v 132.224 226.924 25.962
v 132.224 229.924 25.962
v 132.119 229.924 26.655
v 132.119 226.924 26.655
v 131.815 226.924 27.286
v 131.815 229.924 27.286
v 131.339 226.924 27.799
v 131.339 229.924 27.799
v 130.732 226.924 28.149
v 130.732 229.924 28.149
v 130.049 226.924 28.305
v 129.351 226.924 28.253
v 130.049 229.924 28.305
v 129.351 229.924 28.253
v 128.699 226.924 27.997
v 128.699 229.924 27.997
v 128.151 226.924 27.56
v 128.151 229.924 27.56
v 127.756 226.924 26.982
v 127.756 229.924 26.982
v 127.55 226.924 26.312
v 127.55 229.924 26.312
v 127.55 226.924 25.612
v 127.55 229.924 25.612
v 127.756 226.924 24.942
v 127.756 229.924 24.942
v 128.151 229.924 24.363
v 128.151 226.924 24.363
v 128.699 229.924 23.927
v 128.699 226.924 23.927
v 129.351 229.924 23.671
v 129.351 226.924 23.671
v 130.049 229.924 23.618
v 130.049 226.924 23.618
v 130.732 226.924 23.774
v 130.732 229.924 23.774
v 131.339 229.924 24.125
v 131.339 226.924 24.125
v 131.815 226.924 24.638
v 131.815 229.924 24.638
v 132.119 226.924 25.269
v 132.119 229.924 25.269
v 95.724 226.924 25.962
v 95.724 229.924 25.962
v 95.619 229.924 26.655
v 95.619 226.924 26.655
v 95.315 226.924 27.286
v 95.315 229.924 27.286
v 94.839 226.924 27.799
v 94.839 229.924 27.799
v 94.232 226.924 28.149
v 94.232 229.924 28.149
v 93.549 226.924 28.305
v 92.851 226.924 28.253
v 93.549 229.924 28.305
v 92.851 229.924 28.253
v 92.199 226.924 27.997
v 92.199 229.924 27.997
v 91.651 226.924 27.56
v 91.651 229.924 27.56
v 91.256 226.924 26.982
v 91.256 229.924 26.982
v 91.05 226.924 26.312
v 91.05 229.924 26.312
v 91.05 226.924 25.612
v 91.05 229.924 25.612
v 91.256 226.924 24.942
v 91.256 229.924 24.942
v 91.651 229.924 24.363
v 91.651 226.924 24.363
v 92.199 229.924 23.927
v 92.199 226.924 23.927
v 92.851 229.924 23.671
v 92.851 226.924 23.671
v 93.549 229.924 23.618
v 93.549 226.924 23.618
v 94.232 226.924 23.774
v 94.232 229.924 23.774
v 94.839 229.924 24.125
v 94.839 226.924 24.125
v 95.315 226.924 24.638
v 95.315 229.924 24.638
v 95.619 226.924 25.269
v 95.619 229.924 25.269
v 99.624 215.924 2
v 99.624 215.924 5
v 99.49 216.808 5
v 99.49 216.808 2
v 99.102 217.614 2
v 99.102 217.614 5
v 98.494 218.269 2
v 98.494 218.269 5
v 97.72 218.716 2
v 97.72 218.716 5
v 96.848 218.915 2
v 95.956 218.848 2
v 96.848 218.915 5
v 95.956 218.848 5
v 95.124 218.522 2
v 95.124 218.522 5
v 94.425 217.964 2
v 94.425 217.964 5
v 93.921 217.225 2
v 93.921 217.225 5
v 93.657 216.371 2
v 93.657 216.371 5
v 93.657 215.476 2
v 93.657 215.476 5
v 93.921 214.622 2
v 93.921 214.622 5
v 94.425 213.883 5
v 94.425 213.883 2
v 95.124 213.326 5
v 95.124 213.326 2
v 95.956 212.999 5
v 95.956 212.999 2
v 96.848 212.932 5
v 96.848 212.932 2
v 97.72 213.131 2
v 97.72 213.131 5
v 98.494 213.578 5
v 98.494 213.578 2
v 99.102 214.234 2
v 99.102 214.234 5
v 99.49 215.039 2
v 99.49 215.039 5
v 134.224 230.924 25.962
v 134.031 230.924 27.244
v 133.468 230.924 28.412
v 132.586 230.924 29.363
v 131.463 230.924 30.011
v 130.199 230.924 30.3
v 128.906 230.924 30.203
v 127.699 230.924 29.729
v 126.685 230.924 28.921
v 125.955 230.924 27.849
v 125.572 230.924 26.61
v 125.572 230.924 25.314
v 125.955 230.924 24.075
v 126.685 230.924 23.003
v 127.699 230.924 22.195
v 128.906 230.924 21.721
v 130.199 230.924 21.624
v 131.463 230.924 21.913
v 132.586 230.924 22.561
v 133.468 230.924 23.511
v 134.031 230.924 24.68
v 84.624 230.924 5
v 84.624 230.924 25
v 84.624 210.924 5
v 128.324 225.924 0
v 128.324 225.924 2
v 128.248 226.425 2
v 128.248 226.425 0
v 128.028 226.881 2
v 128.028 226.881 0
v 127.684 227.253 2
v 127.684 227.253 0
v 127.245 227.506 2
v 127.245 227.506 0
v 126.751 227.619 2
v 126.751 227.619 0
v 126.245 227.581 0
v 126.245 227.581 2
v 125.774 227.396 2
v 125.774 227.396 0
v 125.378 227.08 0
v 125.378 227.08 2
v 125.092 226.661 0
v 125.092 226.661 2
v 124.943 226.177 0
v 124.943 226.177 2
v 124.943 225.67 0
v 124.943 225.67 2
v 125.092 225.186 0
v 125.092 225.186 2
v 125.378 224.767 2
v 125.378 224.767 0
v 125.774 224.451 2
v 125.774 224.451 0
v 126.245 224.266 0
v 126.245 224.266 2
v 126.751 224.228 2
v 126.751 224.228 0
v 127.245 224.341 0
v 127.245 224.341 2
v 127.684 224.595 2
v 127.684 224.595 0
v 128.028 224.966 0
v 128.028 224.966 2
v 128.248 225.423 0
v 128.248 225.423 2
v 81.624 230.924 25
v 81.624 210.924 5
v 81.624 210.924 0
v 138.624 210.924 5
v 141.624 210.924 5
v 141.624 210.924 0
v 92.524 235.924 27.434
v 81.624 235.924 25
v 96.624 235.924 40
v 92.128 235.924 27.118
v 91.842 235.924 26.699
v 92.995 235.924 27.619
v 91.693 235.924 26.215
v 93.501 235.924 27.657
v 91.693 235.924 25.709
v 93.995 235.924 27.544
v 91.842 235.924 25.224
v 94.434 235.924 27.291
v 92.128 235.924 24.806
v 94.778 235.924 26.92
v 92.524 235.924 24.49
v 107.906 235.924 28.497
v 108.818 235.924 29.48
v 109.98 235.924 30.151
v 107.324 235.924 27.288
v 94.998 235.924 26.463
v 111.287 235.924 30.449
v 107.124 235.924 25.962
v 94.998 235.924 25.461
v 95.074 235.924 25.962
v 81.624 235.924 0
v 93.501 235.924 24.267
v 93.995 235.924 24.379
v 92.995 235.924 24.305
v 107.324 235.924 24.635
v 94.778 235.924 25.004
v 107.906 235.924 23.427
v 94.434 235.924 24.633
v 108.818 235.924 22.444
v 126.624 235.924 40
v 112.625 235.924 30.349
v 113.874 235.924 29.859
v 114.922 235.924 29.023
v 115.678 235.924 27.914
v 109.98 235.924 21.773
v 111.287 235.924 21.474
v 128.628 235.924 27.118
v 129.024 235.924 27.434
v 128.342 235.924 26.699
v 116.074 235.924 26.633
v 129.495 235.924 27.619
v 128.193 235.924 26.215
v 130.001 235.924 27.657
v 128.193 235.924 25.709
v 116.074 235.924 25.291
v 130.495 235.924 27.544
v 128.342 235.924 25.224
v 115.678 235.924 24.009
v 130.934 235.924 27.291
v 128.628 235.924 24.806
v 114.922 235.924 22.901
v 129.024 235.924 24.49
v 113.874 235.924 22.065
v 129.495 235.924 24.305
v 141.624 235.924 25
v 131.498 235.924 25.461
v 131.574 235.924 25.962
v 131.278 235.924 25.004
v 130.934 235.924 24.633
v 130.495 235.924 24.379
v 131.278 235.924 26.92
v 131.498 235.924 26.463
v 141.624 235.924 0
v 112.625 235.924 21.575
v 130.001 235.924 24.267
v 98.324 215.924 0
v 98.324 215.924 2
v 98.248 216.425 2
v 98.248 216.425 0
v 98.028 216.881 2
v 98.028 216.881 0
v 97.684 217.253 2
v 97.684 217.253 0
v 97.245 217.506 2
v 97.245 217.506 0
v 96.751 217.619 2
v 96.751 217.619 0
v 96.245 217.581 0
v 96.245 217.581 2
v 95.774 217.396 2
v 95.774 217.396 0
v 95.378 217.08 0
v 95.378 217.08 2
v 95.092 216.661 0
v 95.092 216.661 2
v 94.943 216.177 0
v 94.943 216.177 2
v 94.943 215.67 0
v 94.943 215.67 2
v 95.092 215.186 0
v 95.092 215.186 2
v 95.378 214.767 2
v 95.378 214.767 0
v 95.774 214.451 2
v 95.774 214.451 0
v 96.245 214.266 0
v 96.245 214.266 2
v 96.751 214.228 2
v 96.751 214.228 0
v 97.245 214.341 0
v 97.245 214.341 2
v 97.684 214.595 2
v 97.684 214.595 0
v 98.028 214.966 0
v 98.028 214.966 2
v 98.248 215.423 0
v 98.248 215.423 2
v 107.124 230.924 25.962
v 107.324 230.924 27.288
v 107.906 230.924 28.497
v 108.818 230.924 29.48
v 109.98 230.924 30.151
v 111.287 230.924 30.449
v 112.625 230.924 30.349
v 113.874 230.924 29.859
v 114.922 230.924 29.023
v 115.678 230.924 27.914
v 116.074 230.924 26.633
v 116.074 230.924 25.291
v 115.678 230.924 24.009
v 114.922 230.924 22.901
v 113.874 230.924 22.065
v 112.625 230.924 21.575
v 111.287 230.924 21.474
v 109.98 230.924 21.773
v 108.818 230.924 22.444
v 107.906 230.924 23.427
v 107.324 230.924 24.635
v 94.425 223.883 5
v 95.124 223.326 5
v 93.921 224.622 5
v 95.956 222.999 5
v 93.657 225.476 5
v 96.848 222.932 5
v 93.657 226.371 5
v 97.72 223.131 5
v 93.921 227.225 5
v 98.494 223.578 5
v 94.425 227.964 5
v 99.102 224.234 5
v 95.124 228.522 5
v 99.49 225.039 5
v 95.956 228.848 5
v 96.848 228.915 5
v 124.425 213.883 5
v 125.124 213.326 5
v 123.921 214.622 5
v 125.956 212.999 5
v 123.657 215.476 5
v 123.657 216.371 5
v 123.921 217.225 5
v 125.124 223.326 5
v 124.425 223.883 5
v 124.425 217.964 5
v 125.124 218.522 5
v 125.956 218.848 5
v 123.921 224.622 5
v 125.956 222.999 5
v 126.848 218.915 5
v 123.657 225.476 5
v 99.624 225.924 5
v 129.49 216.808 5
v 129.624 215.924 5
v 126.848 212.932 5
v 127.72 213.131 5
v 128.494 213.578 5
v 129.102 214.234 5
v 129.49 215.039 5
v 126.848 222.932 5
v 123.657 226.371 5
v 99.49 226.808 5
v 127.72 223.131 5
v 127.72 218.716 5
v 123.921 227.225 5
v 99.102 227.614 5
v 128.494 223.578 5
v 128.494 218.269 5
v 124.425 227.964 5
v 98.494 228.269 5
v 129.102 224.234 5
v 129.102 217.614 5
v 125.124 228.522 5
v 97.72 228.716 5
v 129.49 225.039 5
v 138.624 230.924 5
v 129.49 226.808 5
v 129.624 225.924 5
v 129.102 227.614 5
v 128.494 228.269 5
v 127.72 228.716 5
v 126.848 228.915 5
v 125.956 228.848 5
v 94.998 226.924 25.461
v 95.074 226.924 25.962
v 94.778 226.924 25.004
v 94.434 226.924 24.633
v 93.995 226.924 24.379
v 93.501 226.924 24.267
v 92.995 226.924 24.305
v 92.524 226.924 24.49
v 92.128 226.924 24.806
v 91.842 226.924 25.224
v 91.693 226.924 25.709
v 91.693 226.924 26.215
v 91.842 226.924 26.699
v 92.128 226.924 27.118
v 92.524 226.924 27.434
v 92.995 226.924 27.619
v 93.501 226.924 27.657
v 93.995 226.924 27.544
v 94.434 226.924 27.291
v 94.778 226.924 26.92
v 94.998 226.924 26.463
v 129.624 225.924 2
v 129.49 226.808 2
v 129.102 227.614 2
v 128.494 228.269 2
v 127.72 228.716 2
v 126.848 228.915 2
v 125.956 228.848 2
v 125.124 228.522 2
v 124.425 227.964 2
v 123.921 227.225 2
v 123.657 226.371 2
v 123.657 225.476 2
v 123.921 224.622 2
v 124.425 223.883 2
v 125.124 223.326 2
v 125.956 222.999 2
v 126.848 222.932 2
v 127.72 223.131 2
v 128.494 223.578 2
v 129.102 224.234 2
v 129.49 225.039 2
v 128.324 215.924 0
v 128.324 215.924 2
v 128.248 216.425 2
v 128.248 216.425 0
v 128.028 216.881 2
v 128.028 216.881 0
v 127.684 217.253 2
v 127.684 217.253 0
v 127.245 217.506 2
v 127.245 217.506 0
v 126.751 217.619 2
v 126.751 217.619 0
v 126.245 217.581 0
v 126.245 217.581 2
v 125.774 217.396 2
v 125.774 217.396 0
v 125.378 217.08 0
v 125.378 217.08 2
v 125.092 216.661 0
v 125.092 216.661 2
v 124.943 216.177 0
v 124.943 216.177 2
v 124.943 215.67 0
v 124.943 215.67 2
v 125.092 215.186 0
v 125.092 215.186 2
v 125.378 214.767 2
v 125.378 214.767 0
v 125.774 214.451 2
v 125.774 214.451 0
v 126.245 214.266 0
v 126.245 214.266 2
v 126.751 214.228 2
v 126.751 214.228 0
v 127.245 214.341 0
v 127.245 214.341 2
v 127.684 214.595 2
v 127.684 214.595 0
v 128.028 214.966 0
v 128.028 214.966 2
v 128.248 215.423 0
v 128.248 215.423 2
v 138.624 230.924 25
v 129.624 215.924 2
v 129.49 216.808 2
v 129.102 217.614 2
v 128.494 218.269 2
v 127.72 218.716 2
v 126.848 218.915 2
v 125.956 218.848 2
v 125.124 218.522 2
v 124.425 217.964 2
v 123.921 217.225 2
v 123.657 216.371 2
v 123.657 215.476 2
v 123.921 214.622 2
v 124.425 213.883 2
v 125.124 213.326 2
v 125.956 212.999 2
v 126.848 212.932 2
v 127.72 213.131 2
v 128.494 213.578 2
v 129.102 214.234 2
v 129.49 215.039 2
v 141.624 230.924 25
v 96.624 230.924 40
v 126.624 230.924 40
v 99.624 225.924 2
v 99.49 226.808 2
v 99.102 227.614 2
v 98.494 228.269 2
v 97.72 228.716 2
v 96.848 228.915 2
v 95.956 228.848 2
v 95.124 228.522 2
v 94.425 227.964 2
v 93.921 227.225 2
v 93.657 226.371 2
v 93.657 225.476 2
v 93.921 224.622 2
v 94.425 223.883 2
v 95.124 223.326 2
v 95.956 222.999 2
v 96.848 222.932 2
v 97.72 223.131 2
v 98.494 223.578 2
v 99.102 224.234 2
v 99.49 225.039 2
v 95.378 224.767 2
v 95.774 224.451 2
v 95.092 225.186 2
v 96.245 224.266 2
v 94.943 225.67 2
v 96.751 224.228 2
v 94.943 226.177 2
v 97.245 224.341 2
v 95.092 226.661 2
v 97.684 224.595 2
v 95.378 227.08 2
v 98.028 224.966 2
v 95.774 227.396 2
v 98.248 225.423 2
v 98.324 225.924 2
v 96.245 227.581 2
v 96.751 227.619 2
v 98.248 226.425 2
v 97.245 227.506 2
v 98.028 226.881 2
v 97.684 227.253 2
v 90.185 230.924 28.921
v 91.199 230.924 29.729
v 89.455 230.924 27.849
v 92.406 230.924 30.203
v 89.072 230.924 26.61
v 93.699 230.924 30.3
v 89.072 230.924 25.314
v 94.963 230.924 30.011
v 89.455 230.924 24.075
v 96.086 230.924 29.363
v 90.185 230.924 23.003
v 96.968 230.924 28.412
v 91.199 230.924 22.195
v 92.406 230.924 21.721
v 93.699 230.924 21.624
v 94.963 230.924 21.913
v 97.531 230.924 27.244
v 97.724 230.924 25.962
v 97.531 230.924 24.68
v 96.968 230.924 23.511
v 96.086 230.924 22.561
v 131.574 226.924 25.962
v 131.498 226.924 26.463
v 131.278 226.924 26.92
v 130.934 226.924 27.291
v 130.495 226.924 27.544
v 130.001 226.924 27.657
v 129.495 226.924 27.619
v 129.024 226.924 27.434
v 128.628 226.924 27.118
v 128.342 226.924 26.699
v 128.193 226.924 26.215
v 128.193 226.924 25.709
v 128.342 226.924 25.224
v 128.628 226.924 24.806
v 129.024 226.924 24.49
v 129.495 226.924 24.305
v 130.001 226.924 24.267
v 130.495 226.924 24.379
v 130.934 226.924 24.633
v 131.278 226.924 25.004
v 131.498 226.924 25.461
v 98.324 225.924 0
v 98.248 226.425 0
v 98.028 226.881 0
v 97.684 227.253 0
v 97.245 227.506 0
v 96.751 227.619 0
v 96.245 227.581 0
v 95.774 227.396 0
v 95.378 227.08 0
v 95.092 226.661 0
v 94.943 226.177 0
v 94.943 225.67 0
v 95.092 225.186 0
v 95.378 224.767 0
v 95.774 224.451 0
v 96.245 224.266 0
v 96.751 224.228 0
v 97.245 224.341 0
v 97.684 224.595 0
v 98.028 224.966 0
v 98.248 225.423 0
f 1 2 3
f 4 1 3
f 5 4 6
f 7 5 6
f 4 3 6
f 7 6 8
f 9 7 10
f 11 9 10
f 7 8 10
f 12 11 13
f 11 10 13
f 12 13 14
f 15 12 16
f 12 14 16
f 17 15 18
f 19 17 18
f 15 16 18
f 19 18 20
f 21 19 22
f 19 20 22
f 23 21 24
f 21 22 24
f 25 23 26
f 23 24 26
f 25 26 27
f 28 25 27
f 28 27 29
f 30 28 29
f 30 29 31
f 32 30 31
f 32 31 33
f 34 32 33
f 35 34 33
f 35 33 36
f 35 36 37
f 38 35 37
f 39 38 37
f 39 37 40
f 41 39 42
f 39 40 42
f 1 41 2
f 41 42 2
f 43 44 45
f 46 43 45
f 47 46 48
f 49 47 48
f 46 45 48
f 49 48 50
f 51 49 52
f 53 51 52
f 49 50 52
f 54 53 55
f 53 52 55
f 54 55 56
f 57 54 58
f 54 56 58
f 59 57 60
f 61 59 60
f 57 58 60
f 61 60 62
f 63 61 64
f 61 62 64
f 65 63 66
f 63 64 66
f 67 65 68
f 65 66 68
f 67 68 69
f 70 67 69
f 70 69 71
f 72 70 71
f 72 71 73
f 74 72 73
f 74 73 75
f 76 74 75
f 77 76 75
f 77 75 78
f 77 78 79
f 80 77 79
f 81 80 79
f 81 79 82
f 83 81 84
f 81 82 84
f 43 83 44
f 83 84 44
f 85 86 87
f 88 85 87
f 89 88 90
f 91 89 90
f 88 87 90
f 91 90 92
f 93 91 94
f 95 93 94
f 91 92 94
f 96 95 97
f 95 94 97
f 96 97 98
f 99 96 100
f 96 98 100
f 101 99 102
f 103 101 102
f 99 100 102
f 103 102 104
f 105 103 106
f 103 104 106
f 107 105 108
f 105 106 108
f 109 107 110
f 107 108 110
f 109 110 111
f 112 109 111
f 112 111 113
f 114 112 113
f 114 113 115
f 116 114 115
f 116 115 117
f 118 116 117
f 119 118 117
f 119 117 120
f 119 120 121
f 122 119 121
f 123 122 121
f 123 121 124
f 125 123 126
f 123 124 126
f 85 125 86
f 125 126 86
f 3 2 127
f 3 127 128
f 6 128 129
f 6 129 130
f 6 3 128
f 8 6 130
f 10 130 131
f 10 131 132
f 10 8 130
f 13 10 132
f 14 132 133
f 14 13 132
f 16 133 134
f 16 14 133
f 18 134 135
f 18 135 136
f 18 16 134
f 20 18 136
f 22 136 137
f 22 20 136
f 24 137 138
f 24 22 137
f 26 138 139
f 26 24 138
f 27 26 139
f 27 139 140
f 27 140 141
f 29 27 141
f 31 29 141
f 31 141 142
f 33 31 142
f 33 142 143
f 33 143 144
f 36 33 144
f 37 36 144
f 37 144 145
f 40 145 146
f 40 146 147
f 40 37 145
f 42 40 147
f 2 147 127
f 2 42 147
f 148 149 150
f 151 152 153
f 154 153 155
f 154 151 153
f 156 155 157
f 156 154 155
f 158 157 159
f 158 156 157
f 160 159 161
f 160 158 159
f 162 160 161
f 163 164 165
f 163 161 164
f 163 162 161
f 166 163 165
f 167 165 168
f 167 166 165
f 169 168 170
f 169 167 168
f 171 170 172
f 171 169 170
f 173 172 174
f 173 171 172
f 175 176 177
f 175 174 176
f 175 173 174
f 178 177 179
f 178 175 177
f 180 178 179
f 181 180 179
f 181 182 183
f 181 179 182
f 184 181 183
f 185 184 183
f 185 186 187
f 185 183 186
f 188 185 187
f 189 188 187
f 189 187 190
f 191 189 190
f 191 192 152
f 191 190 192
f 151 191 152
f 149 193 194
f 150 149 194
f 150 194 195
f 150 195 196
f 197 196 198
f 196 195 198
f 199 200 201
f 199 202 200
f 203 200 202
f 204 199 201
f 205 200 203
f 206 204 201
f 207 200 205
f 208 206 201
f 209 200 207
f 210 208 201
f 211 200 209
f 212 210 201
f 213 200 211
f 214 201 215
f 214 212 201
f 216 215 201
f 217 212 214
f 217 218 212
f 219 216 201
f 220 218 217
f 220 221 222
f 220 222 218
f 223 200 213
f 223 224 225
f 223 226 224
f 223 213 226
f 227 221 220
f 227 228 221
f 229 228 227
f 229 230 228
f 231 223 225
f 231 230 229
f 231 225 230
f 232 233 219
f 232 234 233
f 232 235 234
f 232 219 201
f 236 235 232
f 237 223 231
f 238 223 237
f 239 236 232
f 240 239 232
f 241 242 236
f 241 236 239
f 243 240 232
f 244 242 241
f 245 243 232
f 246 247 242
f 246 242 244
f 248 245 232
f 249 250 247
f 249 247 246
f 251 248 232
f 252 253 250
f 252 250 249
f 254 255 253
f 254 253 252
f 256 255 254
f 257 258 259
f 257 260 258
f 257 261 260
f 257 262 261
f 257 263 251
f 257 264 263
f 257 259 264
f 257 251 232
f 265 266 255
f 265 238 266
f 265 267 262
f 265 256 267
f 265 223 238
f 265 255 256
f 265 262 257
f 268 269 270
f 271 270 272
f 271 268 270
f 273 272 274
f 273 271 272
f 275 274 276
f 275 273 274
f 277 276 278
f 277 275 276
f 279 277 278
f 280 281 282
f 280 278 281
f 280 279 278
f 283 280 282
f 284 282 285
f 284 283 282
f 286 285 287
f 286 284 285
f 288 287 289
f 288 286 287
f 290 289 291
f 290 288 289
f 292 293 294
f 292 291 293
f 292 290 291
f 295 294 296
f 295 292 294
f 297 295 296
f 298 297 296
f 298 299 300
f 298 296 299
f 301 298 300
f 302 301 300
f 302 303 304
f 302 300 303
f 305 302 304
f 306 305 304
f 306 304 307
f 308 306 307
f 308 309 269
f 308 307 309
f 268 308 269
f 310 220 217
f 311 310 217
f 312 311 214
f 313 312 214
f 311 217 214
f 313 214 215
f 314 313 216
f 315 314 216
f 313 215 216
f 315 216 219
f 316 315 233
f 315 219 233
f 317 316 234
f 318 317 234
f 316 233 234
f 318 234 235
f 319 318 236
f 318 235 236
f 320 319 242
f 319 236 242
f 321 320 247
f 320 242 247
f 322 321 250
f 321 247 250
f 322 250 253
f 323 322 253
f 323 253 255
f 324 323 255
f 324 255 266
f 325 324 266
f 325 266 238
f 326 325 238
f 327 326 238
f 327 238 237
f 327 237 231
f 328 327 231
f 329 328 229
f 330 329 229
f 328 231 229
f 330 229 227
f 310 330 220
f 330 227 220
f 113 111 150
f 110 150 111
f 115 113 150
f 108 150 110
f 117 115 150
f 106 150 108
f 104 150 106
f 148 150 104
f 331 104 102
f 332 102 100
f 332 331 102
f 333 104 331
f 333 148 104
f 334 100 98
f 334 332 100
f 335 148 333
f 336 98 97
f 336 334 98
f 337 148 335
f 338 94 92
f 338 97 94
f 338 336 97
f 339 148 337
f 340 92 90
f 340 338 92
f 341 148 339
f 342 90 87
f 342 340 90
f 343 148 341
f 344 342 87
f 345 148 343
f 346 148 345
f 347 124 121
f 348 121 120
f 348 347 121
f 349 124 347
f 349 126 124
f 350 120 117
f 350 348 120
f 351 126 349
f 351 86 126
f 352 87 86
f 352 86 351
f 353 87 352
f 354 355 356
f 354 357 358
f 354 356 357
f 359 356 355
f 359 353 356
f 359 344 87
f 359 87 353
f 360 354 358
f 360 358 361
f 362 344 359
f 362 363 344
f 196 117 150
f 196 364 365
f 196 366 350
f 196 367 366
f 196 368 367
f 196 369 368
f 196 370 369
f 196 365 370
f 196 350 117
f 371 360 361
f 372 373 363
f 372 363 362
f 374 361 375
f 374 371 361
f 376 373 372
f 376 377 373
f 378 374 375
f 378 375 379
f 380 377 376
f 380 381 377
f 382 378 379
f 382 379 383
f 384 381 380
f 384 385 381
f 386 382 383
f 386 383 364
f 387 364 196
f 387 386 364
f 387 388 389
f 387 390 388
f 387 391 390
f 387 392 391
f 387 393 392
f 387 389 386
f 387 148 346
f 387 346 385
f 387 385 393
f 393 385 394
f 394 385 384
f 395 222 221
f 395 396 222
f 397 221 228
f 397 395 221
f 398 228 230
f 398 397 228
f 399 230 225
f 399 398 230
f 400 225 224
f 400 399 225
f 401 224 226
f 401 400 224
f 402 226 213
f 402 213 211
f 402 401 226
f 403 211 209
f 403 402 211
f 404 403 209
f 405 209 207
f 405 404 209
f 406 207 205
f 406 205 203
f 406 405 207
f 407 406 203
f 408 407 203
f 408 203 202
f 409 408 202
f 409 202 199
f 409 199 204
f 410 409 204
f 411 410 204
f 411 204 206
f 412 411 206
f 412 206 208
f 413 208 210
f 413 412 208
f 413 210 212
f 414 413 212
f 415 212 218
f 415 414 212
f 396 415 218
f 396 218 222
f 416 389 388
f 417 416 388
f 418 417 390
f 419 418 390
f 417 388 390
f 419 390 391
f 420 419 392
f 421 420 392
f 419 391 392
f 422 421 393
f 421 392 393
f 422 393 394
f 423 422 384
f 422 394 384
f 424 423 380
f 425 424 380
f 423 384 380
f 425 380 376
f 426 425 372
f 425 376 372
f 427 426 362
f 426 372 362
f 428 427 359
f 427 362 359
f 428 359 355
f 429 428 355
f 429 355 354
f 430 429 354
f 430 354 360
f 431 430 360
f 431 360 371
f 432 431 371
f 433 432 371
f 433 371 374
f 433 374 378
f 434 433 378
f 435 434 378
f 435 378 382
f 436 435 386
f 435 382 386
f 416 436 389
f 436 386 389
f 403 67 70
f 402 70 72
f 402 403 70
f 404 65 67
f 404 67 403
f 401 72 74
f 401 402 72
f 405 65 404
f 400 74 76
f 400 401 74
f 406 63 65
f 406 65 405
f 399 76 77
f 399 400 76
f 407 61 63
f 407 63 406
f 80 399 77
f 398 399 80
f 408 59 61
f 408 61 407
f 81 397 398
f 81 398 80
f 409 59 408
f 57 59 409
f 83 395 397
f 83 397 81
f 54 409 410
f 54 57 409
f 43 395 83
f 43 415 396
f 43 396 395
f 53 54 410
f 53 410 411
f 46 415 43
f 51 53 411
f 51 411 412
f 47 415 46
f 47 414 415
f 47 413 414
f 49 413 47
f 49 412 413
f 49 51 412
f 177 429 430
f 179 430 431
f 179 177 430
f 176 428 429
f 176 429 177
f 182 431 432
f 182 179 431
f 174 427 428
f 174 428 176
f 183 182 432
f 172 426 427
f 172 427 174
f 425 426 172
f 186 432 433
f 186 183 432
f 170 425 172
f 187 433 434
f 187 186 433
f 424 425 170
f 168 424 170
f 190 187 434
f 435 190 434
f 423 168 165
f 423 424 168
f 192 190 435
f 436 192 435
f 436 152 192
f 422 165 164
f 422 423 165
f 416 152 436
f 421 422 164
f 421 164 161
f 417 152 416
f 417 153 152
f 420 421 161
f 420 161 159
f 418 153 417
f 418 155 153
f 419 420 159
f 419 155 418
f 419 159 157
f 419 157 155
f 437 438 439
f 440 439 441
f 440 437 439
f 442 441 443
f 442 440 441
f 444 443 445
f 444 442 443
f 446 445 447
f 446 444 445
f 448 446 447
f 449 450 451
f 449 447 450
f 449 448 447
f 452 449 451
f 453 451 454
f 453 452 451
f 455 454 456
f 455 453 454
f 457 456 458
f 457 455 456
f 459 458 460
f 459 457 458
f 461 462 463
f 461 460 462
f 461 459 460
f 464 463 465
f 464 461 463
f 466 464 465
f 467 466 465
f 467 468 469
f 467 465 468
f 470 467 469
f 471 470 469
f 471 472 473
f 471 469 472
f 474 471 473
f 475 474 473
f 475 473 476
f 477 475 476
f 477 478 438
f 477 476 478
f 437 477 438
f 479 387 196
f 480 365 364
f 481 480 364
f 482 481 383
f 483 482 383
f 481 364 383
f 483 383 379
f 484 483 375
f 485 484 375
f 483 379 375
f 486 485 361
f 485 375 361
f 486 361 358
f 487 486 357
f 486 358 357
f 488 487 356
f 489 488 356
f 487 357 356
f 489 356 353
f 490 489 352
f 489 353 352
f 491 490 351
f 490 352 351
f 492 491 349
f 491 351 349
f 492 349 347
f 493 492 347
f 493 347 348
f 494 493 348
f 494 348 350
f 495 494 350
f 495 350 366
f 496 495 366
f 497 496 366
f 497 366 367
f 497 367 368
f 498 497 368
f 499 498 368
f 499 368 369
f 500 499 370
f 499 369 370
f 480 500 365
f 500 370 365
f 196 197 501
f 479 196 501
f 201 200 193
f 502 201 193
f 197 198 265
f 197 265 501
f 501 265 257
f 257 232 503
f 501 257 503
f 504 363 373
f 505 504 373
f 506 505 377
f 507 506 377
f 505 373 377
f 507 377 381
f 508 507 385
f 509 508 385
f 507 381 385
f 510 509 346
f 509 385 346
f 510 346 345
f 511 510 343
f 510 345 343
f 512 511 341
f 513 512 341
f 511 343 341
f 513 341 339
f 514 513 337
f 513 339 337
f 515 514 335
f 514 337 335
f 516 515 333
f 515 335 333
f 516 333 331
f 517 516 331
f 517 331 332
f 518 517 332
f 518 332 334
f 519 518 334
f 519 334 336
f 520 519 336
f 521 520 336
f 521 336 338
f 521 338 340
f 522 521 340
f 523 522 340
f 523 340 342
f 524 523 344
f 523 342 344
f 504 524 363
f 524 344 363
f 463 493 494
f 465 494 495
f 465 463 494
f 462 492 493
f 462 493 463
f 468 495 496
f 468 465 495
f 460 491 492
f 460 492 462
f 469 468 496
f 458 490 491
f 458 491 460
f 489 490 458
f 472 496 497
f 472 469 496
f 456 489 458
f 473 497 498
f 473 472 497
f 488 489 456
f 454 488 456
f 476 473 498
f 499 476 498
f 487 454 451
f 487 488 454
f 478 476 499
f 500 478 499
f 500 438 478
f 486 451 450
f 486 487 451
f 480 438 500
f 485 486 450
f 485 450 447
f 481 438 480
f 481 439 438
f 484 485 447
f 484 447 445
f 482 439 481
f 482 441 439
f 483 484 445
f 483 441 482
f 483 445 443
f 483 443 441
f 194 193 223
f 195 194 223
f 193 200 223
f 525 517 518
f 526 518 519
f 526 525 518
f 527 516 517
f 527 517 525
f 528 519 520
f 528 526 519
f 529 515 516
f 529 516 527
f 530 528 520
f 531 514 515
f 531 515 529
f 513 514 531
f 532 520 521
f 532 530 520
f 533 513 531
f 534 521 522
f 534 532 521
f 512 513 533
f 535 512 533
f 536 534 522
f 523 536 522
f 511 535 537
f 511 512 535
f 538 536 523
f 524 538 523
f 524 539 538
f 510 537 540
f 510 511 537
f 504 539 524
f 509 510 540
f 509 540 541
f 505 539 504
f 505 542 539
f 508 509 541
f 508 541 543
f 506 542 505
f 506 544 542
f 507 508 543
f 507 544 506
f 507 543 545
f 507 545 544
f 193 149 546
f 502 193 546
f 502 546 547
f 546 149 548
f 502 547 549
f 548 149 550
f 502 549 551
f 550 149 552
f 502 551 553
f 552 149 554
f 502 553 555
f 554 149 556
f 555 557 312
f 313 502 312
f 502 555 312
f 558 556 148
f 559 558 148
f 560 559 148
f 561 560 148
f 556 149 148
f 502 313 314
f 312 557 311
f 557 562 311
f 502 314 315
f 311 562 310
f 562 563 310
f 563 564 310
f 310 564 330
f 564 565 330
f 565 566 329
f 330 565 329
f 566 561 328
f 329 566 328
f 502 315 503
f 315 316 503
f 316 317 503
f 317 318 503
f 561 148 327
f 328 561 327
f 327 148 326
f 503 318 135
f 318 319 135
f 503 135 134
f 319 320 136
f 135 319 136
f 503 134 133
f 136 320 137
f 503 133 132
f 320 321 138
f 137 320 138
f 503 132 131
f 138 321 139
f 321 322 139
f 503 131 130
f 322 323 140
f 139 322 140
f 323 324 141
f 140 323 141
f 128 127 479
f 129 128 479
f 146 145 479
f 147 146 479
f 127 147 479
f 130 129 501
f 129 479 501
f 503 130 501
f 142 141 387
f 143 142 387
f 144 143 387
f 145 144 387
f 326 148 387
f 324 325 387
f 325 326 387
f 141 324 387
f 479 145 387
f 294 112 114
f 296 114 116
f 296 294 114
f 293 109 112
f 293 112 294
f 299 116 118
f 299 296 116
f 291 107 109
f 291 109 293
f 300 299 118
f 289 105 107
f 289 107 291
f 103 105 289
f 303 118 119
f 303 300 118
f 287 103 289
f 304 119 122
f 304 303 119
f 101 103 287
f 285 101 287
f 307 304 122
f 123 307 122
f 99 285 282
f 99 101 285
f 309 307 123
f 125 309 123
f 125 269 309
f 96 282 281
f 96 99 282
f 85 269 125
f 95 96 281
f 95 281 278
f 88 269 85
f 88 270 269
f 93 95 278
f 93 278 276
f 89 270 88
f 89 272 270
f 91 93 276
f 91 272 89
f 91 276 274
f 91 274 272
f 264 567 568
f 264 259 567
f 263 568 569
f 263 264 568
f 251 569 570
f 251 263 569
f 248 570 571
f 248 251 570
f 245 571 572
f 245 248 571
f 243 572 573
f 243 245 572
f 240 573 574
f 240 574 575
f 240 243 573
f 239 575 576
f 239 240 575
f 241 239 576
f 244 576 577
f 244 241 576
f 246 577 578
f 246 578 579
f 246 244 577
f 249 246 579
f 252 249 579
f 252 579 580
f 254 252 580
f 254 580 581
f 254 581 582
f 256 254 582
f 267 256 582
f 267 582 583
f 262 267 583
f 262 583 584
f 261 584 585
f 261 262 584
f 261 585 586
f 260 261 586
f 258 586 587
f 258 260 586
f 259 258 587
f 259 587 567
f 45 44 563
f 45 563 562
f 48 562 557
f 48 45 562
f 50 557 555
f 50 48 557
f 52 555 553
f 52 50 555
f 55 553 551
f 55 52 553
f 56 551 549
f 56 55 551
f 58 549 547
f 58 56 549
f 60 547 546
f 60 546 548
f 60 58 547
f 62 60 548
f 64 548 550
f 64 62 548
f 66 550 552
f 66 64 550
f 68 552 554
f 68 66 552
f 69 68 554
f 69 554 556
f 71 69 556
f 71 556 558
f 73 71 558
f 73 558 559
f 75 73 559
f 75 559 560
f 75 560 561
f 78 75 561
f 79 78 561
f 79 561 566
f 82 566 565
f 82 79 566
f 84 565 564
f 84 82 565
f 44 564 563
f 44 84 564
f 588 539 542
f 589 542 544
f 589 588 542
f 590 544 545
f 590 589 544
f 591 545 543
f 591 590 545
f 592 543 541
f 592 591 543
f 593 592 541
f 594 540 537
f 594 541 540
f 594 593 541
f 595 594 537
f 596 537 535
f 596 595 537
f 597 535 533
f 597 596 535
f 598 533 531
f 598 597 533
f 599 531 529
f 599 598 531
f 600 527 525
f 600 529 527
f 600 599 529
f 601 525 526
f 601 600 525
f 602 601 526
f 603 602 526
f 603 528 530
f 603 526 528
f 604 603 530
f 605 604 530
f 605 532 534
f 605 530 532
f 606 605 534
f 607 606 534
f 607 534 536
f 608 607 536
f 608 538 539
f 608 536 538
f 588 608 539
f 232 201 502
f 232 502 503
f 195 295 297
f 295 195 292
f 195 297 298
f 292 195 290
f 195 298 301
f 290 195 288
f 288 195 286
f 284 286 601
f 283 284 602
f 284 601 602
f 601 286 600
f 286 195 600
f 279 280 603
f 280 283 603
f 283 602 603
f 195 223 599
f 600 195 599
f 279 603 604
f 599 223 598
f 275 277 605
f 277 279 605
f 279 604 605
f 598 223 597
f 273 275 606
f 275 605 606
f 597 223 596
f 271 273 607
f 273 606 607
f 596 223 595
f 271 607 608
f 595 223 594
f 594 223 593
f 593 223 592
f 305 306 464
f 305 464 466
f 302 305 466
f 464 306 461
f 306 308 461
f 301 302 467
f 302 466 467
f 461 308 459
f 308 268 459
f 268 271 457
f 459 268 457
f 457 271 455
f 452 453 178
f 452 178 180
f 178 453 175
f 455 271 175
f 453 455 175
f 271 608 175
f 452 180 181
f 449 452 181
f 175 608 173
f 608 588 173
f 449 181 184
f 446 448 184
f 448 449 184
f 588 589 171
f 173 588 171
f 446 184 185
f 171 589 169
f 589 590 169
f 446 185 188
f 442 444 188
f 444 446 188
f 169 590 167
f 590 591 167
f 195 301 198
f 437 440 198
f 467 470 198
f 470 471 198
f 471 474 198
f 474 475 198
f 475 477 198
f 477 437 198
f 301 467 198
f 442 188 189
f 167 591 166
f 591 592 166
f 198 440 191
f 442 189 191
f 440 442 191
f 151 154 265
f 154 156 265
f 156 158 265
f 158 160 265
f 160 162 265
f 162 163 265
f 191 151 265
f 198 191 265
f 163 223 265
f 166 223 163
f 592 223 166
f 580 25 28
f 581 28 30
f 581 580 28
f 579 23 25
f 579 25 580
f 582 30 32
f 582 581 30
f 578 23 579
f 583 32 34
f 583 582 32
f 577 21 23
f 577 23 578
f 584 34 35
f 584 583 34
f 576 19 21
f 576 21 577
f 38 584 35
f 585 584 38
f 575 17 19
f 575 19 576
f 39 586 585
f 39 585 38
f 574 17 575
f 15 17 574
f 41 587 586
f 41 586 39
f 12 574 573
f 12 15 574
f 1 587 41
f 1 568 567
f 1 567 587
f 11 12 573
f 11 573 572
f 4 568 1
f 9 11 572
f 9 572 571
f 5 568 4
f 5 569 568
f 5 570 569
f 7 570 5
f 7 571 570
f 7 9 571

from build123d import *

# Parameters (mm, degrees)
SKETCH1_R             = 1.7
BOSS_EXTRUDE1_DEPTH   = 5
SKETCH3_W             = 60
SKETCH3_H             = 35
SKETCH3_R             = 4.5
SKETCH3_R_2           = 2.5
BOSS_EXTRUDE2_DEPTH   = 5
SKETCH4_R             = 3
CUT_EXTRUDE1_DEPTH    = 3
SKETCH11_R            = 2.35
SKETCH11_R_2          = 1.7
BOSS_EXTRUDE3_DEPTH   = 4
BOSS_EXTRUDE3_2_DEPTH = 4
SKETCH12_R            = 2.658625551
SKETCH12_R_2          = 1.7
SKETCH12_R_3          = 2.826964015
BOSS_EXTRUDE4_DEPTH   = 5
CHAMFER1_SIZE         = 15
BOSS_EXTRUDE5_DEPTH   = 3
BOSS_EXTRUDE6_DEPTH   = 3
CHAMFER2_SIZE         = 2
CHAMFER2_SIZE2        = 1


with BuildPart() as part:
    # Sketch1 → Boss-Extrude1 (new body)
    # profile 1 of 4: a face of its own
    with BuildSketch(Plane.XY):
        Polygon((111.623766163, 210.92362241), (111.623766163, 235.92362241), (96.623766163, 235.92362241), (91.623766163, 235.92362241), (91.623766163, 225.92362241), (91.623766163, 215.92362241), (91.623766163, 210.92362241), (96.623766163, 210.92362241), align=None)
        with Locations((96.623766163, 215.92362241)):
            Circle(SKETCH1_R, mode=Mode.SUBTRACT)
        with Locations((96.623766163, 225.92362241)):
            Circle(SKETCH1_R, mode=Mode.SUBTRACT)
    # profile 2 of 4: a face of its own
    with BuildSketch(Plane.XY):
        Polygon((126.623766163, 235.92362241), (111.623766163, 235.92362241), (111.623766163, 210.92362241), (126.623766163, 210.92362241), (131.623766163, 210.92362241), (131.623766163, 215.92362241), (131.623766163, 225.92362241), (131.623766163, 235.92362241), align=None)
        with Locations((126.623766163, 215.92362241)):
            Circle(SKETCH1_R, mode=Mode.SUBTRACT)
        with Locations((126.623766163, 225.92362241)):
            Circle(SKETCH1_R, mode=Mode.SUBTRACT)
    # profile 3 of 4: a face of its own
    with BuildSketch(Plane.XY):
        Polygon((91.623766163, 225.92362241), (91.623766163, 235.92362241), (81.623766163, 235.92362241), (81.623766163, 210.92362241), (91.623766163, 210.92362241), (91.623766163, 215.92362241), align=None)
    # profile 4 of 4: a face of its own
    with BuildSketch(Plane.XY):
        Polygon((141.623766163, 235.92362241), (131.623766163, 235.92362241), (131.623766163, 225.92362241), (131.623766163, 215.92362241), (131.623766163, 210.92362241), (141.623766163, 210.92362241), align=None)
    extrude(amount=BOSS_EXTRUDE1_DEPTH)

    # Sketch3 → Boss-Extrude2 (add)
    with BuildSketch(Plane(origin=(0, 235.92362241, 0), x_dir=(1, 0, 0), z_dir=(0, 1, 0))):
        with Locations((111.623766163, -22.5)):
            Rectangle(SKETCH3_W, SKETCH3_H)
        with Locations(Location((111.623766163, -25.961896785, 0), (0, 0, 180))):
            Circle(SKETCH3_R, mode=Mode.SUBTRACT)
        with Locations(Location((129.873766163, -25.961896785, 0), (0, 0, 180))):
            Circle(SKETCH3_R_2, mode=Mode.SUBTRACT)
        with Locations(Location((93.373766163, -25.961896785, 0), (0, 0, 180))):
            Circle(SKETCH3_R_2, mode=Mode.SUBTRACT)
    extrude(amount=-BOSS_EXTRUDE2_DEPTH)

    # Sketch4 → Cut-Extrude1 (cut)
    with BuildSketch(Plane.XY.offset(5)):
        with Locations((126.623766163, 215.92362241)):
            Circle(SKETCH4_R)
        with Locations((126.623766163, 225.92362241)):
            Circle(SKETCH4_R)
        with Locations((96.623766163, 225.92362241)):
            Circle(SKETCH4_R)
        with Locations((96.623766163, 215.92362241)):
            Circle(SKETCH4_R)
    extrude(amount=-CUT_EXTRUDE1_DEPTH, mode=Mode.SUBTRACT)



with BuildPart() as body_2:
    # Sketch11 → Boss-Extrude3 (new body)
    with BuildSketch(Plane.XZ.offset(-230.92362241)):
        with Locations((129.873766163, 25.961896785)):
            Circle(SKETCH11_R)
        with Locations((129.873766163, 25.961896785)):
            Circle(SKETCH11_R_2, mode=Mode.SUBTRACT)
    extrude(amount=BOSS_EXTRUDE3_DEPTH)


with BuildPart() as body_3:
    # Sketch11 → Boss-Extrude3 2 (new body)
    with BuildSketch(Plane.XZ.offset(-230.92362241)):
        with Locations((93.373766163, 25.961896785)):
            Circle(SKETCH11_R)
        with Locations((93.373766163, 25.961896785)):
            Circle(SKETCH11_R_2, mode=Mode.SUBTRACT)
    extrude(amount=BOSS_EXTRUDE3_2_DEPTH)


with BuildPart() as part_1:
    add(part.part)

    add(body_2.part)  # Boss-Extrude4 merges body 2

    add(body_3.part)  # Boss-Extrude4 merges body 3
    # Sketch12 → Boss-Extrude4 (add)
    # profile 1 of 2: a face of its own
    with BuildSketch(Plane(origin=(0, 230.92362241, 0), x_dir=(1, 0, 0), z_dir=(0, 1, 0))):
        with Locations((129.873766163, -25.961896785)):
            Circle(SKETCH12_R)
        with Locations((129.873766163, -25.961896785)):
            Circle(SKETCH12_R_2, mode=Mode.SUBTRACT)
    # profile 2 of 2: a face of its own
    with BuildSketch(Plane(origin=(0, 230.92362241, 0), x_dir=(1, 0, 0), z_dir=(0, 1, 0))):
        with Locations((93.373766163, -25.961896785)):
            Circle(SKETCH12_R_3)
        with Locations((93.373766163, -25.961896785)):
            Circle(SKETCH12_R_2, mode=Mode.SUBTRACT)
    extrude(amount=BOSS_EXTRUDE4_DEPTH)

    # Chamfer1
    chamfer1_edges = [part_1.edges().sort_by_distance(p)[0] for p in [
        (141.623766163, 233.42362241, 40),
        (81.623766163, 233.42362241, 40),
    ]]
    chamfer(chamfer1_edges, length=CHAMFER1_SIZE)

    # Sketch13 → Boss-Extrude5 (add)
    with BuildSketch(Plane.ZY.offset(-81.623766163)):
        Polygon((25, 230.92362241), (5, 210.92362241), (5, 230.92362241), align=None)
        Polygon((5, 210.92362241), (5, 230.92362241), (25, 230.92362241), (25, 235.92362241), (0, 235.92362241), (0, 210.92362241), align=None)
    extrude(amount=-BOSS_EXTRUDE5_DEPTH)

    # Sketch14 → Boss-Extrude6 (add)
    with BuildSketch(Plane(origin=(141.623766163, 0, 0), x_dir=(0, 0, -1), z_dir=(1, 0, 0))):
        Polygon((-5, 210.92362241), (-25, 230.92362241), (-5, 230.92362241), align=None)
        Polygon((0, 210.92362241), (0, 235.92362241), (-25, 235.92362241), (-25, 230.92362241), (-5, 230.92362241), (-5, 210.92362241), align=None)
    extrude(amount=-BOSS_EXTRUDE6_DEPTH)

    # Chamfer2
    chamfer2_edges = [part_1.edges().sort_by_distance(p)[0] for p in [
        (91.023766163, 230.92362241, 25.961896785),
        (127.523766163, 230.92362241, 25.961896785),
    ]]
    chamfer2_side = [part_1.faces().sort_by_distance(p)[0] for p in [
        (111.623766163, 230.92362241, 21.140138657),
    ]]
    chamfer(chamfer2_edges, length=CHAMFER2_SIZE, length2=CHAMFER2_SIZE2, reference=chamfer2_side[0])


solid = part_1.part
